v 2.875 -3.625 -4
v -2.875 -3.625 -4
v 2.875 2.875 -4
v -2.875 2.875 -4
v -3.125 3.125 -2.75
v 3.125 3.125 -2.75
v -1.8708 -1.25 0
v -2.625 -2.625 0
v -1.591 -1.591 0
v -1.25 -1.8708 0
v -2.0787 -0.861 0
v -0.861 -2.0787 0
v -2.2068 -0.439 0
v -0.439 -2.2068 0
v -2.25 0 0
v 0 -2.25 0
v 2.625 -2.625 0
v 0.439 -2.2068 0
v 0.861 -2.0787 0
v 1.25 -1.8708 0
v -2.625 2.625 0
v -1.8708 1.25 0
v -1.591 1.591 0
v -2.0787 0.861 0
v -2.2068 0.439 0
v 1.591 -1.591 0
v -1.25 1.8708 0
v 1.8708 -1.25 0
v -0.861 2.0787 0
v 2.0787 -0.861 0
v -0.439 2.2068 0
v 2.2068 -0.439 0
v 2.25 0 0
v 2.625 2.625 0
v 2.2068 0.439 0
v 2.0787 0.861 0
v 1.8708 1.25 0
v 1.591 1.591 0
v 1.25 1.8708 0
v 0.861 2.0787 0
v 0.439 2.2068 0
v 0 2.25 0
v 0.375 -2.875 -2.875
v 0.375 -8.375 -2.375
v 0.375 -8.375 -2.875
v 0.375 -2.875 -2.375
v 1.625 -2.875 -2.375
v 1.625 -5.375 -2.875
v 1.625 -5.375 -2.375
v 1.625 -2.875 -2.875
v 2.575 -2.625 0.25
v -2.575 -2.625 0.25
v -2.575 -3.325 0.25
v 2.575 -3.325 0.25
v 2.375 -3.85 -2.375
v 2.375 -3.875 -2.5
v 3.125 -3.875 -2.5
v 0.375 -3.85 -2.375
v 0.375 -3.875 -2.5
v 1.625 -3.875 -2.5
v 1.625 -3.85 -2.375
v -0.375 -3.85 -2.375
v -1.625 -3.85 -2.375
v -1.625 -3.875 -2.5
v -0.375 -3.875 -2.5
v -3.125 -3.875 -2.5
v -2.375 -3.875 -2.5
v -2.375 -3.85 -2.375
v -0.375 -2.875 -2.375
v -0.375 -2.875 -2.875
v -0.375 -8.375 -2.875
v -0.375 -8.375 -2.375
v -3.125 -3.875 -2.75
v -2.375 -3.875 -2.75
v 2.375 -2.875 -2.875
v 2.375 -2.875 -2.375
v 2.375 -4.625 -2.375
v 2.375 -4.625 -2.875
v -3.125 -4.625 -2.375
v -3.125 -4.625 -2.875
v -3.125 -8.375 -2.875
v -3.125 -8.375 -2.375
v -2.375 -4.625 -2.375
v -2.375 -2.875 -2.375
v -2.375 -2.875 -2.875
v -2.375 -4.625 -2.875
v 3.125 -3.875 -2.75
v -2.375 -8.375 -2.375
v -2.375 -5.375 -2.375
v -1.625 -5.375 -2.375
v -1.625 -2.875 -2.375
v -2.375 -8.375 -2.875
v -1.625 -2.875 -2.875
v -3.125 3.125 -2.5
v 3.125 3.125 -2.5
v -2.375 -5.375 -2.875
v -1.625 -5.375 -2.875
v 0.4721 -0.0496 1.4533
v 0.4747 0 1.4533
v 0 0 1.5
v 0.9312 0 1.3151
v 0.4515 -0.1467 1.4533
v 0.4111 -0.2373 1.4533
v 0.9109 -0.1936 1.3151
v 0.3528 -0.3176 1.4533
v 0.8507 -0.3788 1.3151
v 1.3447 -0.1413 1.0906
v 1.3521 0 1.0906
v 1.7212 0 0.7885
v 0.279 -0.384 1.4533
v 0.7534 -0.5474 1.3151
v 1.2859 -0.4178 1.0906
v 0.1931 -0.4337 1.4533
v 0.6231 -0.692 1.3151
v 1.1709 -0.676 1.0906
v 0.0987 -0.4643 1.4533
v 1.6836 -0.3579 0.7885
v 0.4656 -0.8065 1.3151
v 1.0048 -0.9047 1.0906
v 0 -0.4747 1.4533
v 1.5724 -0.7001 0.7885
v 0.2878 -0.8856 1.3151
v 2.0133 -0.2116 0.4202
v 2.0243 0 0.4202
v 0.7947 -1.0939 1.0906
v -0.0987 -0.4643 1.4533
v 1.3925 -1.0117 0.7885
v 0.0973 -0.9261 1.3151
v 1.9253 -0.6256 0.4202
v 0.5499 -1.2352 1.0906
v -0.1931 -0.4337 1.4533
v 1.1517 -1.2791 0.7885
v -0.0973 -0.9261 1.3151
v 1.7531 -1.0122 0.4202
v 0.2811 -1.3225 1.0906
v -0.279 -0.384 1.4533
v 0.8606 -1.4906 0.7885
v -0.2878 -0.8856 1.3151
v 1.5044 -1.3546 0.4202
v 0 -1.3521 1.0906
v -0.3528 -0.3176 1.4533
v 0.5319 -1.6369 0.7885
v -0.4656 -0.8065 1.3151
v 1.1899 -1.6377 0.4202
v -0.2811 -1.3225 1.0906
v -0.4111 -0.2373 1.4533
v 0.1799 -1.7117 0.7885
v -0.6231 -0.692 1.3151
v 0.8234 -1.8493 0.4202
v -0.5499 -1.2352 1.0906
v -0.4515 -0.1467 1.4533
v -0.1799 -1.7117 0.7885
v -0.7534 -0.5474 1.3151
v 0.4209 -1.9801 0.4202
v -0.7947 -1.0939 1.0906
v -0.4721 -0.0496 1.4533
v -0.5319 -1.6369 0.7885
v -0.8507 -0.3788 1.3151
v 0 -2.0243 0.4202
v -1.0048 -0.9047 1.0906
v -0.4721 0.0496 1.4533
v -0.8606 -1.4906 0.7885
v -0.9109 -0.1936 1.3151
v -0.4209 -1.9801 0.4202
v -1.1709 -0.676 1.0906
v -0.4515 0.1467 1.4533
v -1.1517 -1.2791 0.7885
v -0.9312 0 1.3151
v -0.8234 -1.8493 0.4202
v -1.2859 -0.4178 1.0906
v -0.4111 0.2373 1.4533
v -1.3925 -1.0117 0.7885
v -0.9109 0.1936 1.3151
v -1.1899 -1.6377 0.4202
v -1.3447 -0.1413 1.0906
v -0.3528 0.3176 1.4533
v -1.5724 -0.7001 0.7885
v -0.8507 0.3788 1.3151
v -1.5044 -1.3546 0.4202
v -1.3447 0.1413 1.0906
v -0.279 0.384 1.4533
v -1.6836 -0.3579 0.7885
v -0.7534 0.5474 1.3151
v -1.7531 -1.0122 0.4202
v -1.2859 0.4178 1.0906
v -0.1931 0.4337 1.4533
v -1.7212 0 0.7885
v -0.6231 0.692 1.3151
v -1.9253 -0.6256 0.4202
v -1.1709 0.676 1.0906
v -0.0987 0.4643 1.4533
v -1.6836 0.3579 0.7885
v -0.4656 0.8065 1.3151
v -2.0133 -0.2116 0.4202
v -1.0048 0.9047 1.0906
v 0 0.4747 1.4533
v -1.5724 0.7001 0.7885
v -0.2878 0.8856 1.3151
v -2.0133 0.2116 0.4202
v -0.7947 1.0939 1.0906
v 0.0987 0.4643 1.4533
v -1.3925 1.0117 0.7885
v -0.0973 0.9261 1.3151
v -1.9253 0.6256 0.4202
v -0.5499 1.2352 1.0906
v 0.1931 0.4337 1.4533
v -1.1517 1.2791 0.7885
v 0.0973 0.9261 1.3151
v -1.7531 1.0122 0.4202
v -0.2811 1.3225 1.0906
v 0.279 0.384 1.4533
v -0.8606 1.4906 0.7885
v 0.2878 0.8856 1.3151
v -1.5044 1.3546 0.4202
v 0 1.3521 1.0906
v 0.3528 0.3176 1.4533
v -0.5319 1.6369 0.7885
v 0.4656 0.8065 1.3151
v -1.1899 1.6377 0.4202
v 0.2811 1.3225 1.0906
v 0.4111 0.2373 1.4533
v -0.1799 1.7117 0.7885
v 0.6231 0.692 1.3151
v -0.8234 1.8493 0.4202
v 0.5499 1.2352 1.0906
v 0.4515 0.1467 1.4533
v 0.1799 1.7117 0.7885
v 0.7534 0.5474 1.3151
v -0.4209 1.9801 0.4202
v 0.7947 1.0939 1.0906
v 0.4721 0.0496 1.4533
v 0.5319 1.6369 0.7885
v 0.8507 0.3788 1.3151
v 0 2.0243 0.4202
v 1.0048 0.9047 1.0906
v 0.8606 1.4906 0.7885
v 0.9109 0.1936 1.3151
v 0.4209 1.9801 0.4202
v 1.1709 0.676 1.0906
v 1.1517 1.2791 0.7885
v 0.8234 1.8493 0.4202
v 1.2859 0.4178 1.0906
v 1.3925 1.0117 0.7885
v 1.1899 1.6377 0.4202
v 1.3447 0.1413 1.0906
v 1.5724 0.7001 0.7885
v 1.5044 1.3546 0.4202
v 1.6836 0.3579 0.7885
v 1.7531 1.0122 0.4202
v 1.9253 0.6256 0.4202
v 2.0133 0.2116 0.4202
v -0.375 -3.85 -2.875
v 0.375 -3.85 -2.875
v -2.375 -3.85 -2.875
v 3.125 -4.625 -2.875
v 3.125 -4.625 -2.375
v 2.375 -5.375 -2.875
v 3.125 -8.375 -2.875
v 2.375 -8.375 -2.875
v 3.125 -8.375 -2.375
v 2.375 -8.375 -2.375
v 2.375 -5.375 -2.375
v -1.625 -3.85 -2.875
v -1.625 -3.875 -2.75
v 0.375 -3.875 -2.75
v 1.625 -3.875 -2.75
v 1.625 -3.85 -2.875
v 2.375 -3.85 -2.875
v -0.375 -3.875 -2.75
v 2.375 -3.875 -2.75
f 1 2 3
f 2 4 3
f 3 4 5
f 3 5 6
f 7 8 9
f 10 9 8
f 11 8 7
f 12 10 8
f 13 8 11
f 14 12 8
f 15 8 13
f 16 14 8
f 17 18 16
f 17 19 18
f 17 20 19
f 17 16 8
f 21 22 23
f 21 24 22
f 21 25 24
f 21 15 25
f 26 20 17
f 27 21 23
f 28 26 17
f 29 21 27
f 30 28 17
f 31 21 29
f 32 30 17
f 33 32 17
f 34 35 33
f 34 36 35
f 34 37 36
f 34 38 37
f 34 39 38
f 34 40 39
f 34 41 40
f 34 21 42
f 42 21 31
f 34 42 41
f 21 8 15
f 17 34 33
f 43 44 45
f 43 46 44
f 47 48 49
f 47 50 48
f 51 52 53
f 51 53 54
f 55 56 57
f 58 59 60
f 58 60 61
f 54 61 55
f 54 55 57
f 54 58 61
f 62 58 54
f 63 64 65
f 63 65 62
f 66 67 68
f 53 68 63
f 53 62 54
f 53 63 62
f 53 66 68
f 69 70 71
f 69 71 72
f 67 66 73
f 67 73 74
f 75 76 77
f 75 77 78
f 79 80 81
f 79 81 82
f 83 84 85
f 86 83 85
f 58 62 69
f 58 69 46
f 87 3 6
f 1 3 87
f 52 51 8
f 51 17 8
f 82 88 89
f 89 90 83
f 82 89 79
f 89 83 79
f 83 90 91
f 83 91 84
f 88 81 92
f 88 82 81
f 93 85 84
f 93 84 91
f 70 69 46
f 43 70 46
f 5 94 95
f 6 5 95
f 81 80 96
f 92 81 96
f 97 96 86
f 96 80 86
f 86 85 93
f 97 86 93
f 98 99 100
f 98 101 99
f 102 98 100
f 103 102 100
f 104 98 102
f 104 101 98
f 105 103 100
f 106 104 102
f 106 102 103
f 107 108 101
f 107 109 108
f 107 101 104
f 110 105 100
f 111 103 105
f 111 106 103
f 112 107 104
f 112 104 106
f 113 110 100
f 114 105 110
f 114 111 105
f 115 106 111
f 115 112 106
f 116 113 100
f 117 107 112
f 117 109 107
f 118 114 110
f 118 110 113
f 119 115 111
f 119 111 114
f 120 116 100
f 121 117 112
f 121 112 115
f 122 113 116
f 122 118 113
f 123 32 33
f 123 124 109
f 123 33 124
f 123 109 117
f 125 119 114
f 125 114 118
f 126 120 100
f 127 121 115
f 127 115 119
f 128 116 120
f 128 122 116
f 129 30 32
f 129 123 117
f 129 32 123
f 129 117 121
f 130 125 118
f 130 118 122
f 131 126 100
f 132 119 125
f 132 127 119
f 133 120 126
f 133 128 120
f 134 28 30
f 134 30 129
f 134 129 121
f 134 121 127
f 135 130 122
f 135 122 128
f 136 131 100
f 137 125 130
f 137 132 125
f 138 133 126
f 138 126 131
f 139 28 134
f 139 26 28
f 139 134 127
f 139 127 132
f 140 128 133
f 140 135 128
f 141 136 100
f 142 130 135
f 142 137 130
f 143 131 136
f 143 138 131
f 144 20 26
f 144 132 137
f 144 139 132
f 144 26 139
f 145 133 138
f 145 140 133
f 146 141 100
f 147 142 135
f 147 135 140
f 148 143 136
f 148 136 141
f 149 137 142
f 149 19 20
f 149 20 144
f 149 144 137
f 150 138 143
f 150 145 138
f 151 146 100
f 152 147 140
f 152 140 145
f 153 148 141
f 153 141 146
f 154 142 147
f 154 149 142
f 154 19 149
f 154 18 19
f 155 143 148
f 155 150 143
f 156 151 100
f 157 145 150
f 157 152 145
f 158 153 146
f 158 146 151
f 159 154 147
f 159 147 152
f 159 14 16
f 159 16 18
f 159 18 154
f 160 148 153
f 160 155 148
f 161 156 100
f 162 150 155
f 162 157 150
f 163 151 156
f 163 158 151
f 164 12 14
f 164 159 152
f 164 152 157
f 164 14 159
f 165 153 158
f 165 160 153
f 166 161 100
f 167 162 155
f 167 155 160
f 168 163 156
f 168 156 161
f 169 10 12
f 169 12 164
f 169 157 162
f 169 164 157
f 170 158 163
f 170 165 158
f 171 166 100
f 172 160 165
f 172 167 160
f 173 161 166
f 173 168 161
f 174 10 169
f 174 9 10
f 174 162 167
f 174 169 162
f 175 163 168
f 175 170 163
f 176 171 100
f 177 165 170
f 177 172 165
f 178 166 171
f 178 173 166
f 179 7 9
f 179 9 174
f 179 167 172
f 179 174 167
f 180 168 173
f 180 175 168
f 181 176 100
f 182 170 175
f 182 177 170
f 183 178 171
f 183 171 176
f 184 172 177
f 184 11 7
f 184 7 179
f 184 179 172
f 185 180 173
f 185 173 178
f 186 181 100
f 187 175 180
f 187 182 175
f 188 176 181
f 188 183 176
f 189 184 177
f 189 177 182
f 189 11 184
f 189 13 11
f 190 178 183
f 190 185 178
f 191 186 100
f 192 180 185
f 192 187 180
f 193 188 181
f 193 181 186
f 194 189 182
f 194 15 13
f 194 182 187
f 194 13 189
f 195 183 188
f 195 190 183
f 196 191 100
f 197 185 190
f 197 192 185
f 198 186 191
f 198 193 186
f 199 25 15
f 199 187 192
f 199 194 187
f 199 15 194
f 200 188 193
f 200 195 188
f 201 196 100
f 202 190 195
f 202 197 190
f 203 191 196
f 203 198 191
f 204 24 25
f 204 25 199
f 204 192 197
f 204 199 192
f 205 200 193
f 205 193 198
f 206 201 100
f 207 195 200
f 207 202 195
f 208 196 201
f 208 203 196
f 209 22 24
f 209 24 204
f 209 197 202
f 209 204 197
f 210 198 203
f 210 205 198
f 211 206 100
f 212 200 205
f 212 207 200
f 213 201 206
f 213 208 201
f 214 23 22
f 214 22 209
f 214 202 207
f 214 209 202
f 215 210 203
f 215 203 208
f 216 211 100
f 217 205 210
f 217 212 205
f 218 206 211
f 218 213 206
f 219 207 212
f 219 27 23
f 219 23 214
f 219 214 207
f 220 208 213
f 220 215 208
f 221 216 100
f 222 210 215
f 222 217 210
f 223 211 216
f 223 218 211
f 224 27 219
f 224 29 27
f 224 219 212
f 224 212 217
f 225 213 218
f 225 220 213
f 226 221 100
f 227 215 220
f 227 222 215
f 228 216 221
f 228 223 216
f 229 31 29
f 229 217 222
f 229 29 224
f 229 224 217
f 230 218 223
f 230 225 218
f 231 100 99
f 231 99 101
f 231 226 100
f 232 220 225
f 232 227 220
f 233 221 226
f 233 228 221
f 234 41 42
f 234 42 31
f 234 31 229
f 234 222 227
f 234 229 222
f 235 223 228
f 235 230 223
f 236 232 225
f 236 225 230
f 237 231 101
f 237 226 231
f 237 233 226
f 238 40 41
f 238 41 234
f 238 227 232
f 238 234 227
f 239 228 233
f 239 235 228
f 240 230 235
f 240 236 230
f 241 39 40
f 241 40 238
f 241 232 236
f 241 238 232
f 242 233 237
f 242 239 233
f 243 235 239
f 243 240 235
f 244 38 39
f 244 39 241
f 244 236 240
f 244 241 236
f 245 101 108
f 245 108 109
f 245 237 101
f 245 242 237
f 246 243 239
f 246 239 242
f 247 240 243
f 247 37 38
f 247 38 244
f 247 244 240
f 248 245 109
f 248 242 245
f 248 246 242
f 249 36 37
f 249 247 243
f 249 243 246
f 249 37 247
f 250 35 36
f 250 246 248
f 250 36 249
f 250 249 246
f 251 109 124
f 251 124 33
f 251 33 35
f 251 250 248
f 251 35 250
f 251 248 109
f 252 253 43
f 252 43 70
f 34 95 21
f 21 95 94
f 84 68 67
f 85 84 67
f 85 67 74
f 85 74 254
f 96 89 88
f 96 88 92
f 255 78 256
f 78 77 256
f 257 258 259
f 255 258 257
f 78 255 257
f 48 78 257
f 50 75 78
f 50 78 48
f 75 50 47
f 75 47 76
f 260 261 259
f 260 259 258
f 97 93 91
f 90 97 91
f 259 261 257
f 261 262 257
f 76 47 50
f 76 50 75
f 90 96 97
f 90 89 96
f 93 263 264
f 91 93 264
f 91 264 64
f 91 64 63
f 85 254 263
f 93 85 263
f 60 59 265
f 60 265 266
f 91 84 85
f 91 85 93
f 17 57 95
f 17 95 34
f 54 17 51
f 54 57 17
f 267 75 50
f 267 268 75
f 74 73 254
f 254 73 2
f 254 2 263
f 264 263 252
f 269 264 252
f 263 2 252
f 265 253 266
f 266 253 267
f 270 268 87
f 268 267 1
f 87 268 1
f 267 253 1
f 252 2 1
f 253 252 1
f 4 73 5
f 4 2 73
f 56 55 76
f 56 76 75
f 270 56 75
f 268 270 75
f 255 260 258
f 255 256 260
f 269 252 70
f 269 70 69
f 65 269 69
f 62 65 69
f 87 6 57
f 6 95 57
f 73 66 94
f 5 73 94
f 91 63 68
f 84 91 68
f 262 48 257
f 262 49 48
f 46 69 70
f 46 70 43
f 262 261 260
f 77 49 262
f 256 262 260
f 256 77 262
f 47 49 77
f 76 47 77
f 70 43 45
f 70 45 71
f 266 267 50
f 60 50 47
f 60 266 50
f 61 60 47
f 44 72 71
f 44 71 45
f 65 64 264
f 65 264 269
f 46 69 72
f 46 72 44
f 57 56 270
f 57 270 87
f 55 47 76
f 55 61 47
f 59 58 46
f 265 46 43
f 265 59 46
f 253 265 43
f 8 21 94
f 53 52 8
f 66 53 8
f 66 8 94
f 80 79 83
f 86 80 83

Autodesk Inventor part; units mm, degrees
ref_plane "YZ Plane" through (0, 0, 0) normal (1, 0, 0) x (0, 1, 0)
ref_plane "XZ Plane" through (0, 0, 0) normal (0, 1, 0) x (-1, 0, 0)
sketch "Sketch1" plane through (0, 0, 0) normal (0, 0, 1) x (1, 0, 0)
  line L0 (-3.125, -3.125) -> (-3.125, 3.125)
  line L1 (-3.125, 3.125) -> (3.125, 3.125)
  line L2 (3.125, 3.125) -> (3.125, -3.125)
  line L3 (3.125, -3.125) -> (-3.125, 3.125) construction
  line L4 (-3.125, -3.125) -> (3.125, 3.125) construction
  line L5 (-3.125, -3.125) -> (-3.125, -3.875)
  line L6 (-3.125, -3.875) -> (3.125, -3.875)
  line L7 (3.125, -3.875) -> (3.125, -3.125)
  circle A0 centre (0, 0) radius 2.25
  line L8 (2.625, -2.625) -> (-2.625, -2.625)
  line L9 (-2.625, -2.625) -> (-2.625, 2.625)
  line L10 (-2.625, 2.625) -> (2.625, 2.625)
  line L11 (2.625, 2.625) -> (2.625, -2.625)
  line L12 (2.625, -2.625) -> (-2.625, 2.625) construction
  line L13 (-2.625, -2.625) -> (2.625, 2.625) construction
  line L14 (-3.125, -3.125) -> (-3.125, -2.625)
  line L15 (3.125, -2.625) -> (3.125, -3.125)
  line L16 (-2.625, -2.625) -> (2.625, -2.625)
  line L17 (2.625, -3.875) -> (-2.625, -3.875)
  line L18 (-2.625, -3.875) -> (2.625, -3.875)
  line L19 (2.625, -3.375) -> (-2.625, -3.375)
  line L20 (-2.625, 2.625) -> (2.625, 2.625)
  line L21 (2.625, 2.625) -> (2.625, -3.375)
  line L22 (2.625, -3.375) -> (-2.625, -3.375)
  line L23 (-2.625, -3.375) -> (-2.625, 2.625)
  line L24 (-2.625, -2.625) -> (2.625, -2.625)
  line L25 (-3.125, 3.125) -> (3.125, 3.125)
  line L26 (3.125, 3.125) -> (3.125, -3.375)
  line L27 (-3.125, -3.375) -> (-3.125, 3.125)
  line L28 (2.625, -3.375) -> (2.625, -2.625)
  line L29 (-2.625, -3.375) -> (-2.625, -2.625)
  line L30 (-2.625, -3.375) -> (-2.625, -3.875)
  line L31 (2.625, -3.375) -> (2.625, -3.875)
  line L32 (-2.625, -3.375) -> (2.625, -3.375)
  line L33 (-3.125, -3.875) -> (3.125, -3.875)
  line L34 (3.125, -3.875) -> (3.125, -2.625)
  line L35 (3.125, -2.625) -> (-3.125, -2.625)
  line L36 (-3.125, -2.625) -> (-3.125, -3.875)
  dimension "d0" = 6.25
  dimension "d1" = 6.25
  dimension "d3" = 0.75
  dimension "d4" = 4.5
  dimension "d5" = 5.25
extrude "Extrusion1" add sketch "Sketch1" against normal blind 4 contours L0 L35 L23 L30 L6 L5 | L0 L1 L2 L35 L11 L10 L9 | L9 L10 L11 L8 | L8 L21 L19 L23 | L35 L2 L7 L6 L31 L21 | L19 L31 L6 L30 | A0
extrude "Extrusion2" add sketch "Sketch1" along normal blind 0.25 contours L0 L35 L23 L30 L6 L5 | L8 L21 L19 L23 | L35 L2 L7 L6 L31 L21 | L19 L31 L6 L30
ref_plane "Work Plane1" through (-3.125, 0, 0) normal (0, 1, 0) x (1, 0, 0)
sketch "Sketch2" plane through (-3.125, 0, 0) normal (0, 1, 0) x (1, 0, 0)
  line L0 (0, -0.25) -> (0, 4) projected
  line L1 (6.25, 0) -> (0, 0) projected
  line L2 (0, 0) -> (6.25, 0)
  line L3 (3.125, 0) -> (3.125, -1.5)
  line L4 (3.125, 0) -> (5.375, 0)
  line L5 (3.125, 0) -> (0.875, 0)
  arc A0 (0.875, 0) -> (5.375, 0) centre (3.125, 0.9375) ccw
  dimension "d13" = 1.5
  dimension "d14" = 2.25
  dimension "d15" = 2.25
revolve "Revolution1" add sketch "Sketch2" angle 360 about axis through (0, 0, 0) along (0, 0, 1) picked at (4.5315, -0.1662) contours A0 L3 L1
chamfer "Chamfer1" distance 0.5 distance2 2.5 1 edges at (0, 3.125, 0) measured on face at (-0.0904, 2.8279, 0)
sketch "Sketch3" plane through (-3.125, -3.875, -4) normal (-1, 0, 0) x (0, 0, 1)
  line L0 (1.5, 7) -> (0, 7) projected
  line L1 (1.5, 7) -> (1.5, 0)
  line L2 (4.25, 0) -> (0, 0) projected
  line L3 (4, 0) -> (4, 0.5)
  line L4 (1.5, 0) -> (4, 0.5)
  line L5 (4, 0.5) -> (4.25, 0.55)
  line L6 (4.25, 1.25) -> (4.25, 0) projected
  line L7 (4.25, 0.55) -> (4.25, 0)
  line L8 (4.25, 0) -> (1.5, 0)
  point P0 (4, 3.875)
  dimension "d20" = 0.5
extrude "Extrusion3" cut sketch "Sketch3" against normal blind 10
sketch "Sketch4" plane through (-3.125, -3.875, -4) normal (0, -1, 0) x (1, 0, 0)
  line L0 (0, 4) -> (6.25, 4) projected
  line L1 (0, 4) -> (0.5, 4)
  line L2 (0, 1.5) -> (0, 0) projected
  line L3 (0.5, 4) -> (0, 1.5)
  line L4 (0, 4) -> (0, 4.25) projected
  line L5 (0, 1.5) -> (0, 4)
  line L6 (0, 4) -> (0, 4.25)
  line L7 (0.5, 4) -> (0.55, 4.25)
  line L8 (6.25, 4.25) -> (0, 4.25) projected
  line L9 (0.55, 4.25) -> (0, 4.25)
  line L10 (3.125, 4) -> (3.125, 3.0842)
  line L11 (6.25, 4) -> (5.75, 4)
  line L12 (5.75, 4) -> (6.25, 1.5)
  line L13 (6.25, 4) -> (6.25, 4.25)
  line L14 (6.25, 1.5) -> (6.25, 4)
  line L15 (6.25, 4) -> (6.25, 4.25)
  line L16 (5.75, 4) -> (5.7, 4.25)
  line L17 (5.7, 4.25) -> (6.25, 4.25)
  dimension "d23" = 0.5
extrude "Extrusion4" cut sketch "Sketch4" against normal blind 10 contours L4 L8 L7 L0 | L0 L3 L5 | L16 L8 L13 L0 | L0 L14 L12
chamfer "Chamfer2" distance 1.25 distance2 0.25 1 edges at (0, 3.125, -4) measured on face at (1.0417, 3.125, -3)
chamfer "Chamfer3" distance 1.25 distance2 0.25 1 edges at (0, -3.875, -4) measured on face at (-1.0417, -3.875, -3)
chamfer "Chamfer4" distance 1.25 distance2 0.25 1 edges at (-3.125, -0.375, -4) measured on face at (-3.125, 0.7083, -3.1667)
chamfer "Chamfer5" distance 1.25 distance2 0.25 1 edges at (3.125, -0.375, -4) measured on face at (3.125, 0.7083, -3.1667)
sketch "Sketch5" plane through (-3.125, -3.875, -2.5) normal (0, -1, 0) x (1, 0, 0)
  line L0 (6.25, 0) -> (0, 0) projected
  line L1 (3.125, 0) -> (3.125, -0.25)
  line L2 (6.25, -0.25) -> (0, -0.25) projected
  line L3 (3.5, -0.375) -> (2.75, -0.375)
  line L4 (2.75, -0.375) -> (2.75, 0.125)
  line L5 (2.75, 0.125) -> (3.5, 0.125)
  line L6 (3.5, 0.125) -> (3.5, -0.375)
  line L7 (3.5, -0.375) -> (2.75, 0.125) construction
  line L8 (2.75, -0.375) -> (3.5, 0.125) construction
  point P0 (3.125, 2.5)
  point P1 (3.125, -0.125)
  dimension "d38" = 0.75
  dimension "d39" = 0.5
extrude "Extrusion5" cut sketch "Sketch5" against normal blind 1
sketch "Sketch6" plane through (-3.125, -2.875, -2.5) normal (0, -1, 0) x (1, 0, 0)
  line L0 (2.75, -0.375) -> (2.75, 0.125) projected
  line L1 (3.5, 0.125) -> (3.5, -0.375) projected
  line L2 (2.75, 0.125) -> (3.5, 0.125)
  line L3 (3.5, 0.125) -> (3.5, -0.375)
  line L4 (3.5, -0.375) -> (2.75, -0.375)
  line L5 (2.75, -0.375) -> (2.75, 0.125)
  point P0 (3.125, 2.5)
extrude "Extrusion6" add sketch "Sketch6" along normal blind 14.5 separate body
sketch "Sketch7" plane through (-3.125, -17.375, -2.5) normal (0, -1, 0) x (1, 0, 0)
  line L0 (3.5, 0.125) -> (2.75, 0.125) projected
  line L1 (2.75, -0.375) -> (3.5, -0.375) projected
  line L2 (2.75, 0.125) -> (3.5, 0.125)
  line L3 (3.5, 0.125) -> (3.5, -0.375)
  line L4 (3.5, -0.375) -> (2.75, -0.375)
  line L5 (2.75, -0.375) -> (2.75, 0.125)
  point P0 (3.125, 2.5)
extrude "Extrusion7" add sketch "Sketch7" along normal blind 10 bodies 2
sketch "Sketch8" plane through (-3.125, -3.875, -2.75) normal (0, -1, 0) x (1, 0, 0)
  line L0 (2.75, 0.375) -> (3.5, 0.375) projected
  line L1 (2.75, 0.375) -> (1.5, 0.375)
  line L2 (1.5, 0.375) -> (0.75, 0.375)
  line L3 (0.75, 0.375) -> (0.75, -0.125)
  line L4 (0.75, -0.125) -> (1.5, -0.125)
  line L5 (1.5, -0.125) -> (1.5, 0.375)
  line L6 (3.5, 0.375) -> (4.75, 0.375)
  line L7 (4.75, 0.375) -> (5.5, 0.375)
  line L8 (5.5, 0.375) -> (5.5, -0.125)
  line L9 (5.5, -0.125) -> (4.75, -0.125)
  line L10 (4.75, -0.125) -> (4.75, 0.375)
  point P0 (3.125, 2.75)
  dimension "d46" = 1.25
  dimension "d47" = 0.75
  dimension "d48" = 0.5
  dimension "d49" = 1.25
  dimension "d50" = 0.75
  dimension "d51" = 0.5
extrude "Extrusion8" cut sketch "Sketch8" against normal blind 1 bodies 1
sketch "Sketch9" plane through (-3.125, -2.875, -2.5) normal (0, 1, 0) x (1, 0, 0)
  line L0 (2.75, -0.125) -> (2.75, 0.375) projected
  line L1 (2.75, -0.125) -> (1.5, -0.125)
  line L2 (3.5, -0.125) -> (2.75, -0.125) projected
  line L3 (3.5, -0.125) -> (4.75, -0.125)
  line L4 (1.5, -0.125) -> (0.75, -0.125)
  line L5 (0.75, -0.125) -> (0.75, 0.375)
  line L6 (0.75, 0.375) -> (1.5, 0.375)
  line L7 (1.5, 0.375) -> (1.5, -0.125)
  line L8 (4.75, -0.125) -> (5.5, -0.125)
  line L9 (5.5, -0.125) -> (5.5, 0.375)
  line L10 (5.5, 0.375) -> (4.75, 0.375)
  line L11 (4.75, 0.375) -> (4.75, -0.125)
  point P0 (3.125, -2.5)
  dimension "d54" = 1.25
  dimension "d55" = 1.25
  dimension "d56" = 0.75
  dimension "d57" = 0.5
  dimension "d58" = 0.75
  dimension "d59" = 0.5
extrude "Extrusion9" add sketch "Sketch9" against normal blind 1.75 bodies 2
sketch "Sketch10" plane through (-3.125, -4.625, -2.5) normal (0, -1, 0) x (1, 0, 0)
  line L0 (1.5, -0.375) -> (0.75, -0.375) projected
  line L1 (1.5, -0.375) -> (0, -0.375)
  line L2 (0, -0.375) -> (0, 0.125)
  line L3 (0, 0.125) -> (1.5, 0.125)
  line L4 (1.5, 0.125) -> (1.5, -0.375)
  line L5 (5.5, 0.125) -> (4.75, 0.125) projected
  line L6 (4.75, 0.125) -> (6.25, 0.125)
  line L7 (6.25, 0.125) -> (6.25, -0.375)
  line L8 (6.25, -0.375) -> (4.75, -0.375)
  line L9 (4.75, -0.375) -> (4.75, 0.125)
  point P0 (3.125, 2.5)
  dimension "d62" = 1.5
  dimension "d63" = 0.5
  dimension "d64" = 1.5
extrude "Extrusion10" add sketch "Sketch10" along normal blind 0.75 bodies 2
sketch "Sketch11" plane through (-3.125, -5.375, -2.5) normal (0, -1, 0) x (1, 0, 0)
  line L0 (0, 0.125) -> (0, -0.375) projected
  line L1 (0, -0.375) -> (0.75, -0.375) projected
  line L2 (0, 0.125) -> (0.75, 0.125)
  line L3 (0.75, 0.125) -> (0.75, -0.375)
  line L4 (0.75, -0.375) -> (0, -0.375)
  line L5 (0, -0.375) -> (0, 0.125)
  line L6 (6.25, 0.125) -> (4.75, 0.125) projected
  line L7 (5.5, -0.375) -> (6.25, -0.375) projected
  line L8 (6.25, 0.125) -> (5.5, 0.125)
  line L9 (5.5, 0.125) -> (5.5, -0.375)
  line L10 (5.5, -0.375) -> (6.25, -0.375)
  line L11 (6.25, -0.375) -> (6.25, 0.125)
  point P0 (3.125, 2.5)
  dimension "d67" = 0.75
extrude "Extrusion11" add sketch "Sketch11" along normal blind 22 bodies 2
sketch "Sketch12" plane through (-3.125, -27.375, -2.5) normal (0, -1, 0) x (1, 0, 0)
  line L0 (-2.9615, 1.6118) -> (7.9357, 1.6118)
  line L1 (7.9357, 1.6118) -> (7.9357, -0.9635)
  line L2 (7.9357, -0.9635) -> (-2.9615, -0.9635)
  line L3 (-2.9615, -0.9635) -> (-2.9615, 1.6118)
  point P0 (3.125, 2.5)
extrude "Extrusion12" cut sketch "Sketch12" against normal blind 19 bodies 2
properties part number "TSOP4838"
